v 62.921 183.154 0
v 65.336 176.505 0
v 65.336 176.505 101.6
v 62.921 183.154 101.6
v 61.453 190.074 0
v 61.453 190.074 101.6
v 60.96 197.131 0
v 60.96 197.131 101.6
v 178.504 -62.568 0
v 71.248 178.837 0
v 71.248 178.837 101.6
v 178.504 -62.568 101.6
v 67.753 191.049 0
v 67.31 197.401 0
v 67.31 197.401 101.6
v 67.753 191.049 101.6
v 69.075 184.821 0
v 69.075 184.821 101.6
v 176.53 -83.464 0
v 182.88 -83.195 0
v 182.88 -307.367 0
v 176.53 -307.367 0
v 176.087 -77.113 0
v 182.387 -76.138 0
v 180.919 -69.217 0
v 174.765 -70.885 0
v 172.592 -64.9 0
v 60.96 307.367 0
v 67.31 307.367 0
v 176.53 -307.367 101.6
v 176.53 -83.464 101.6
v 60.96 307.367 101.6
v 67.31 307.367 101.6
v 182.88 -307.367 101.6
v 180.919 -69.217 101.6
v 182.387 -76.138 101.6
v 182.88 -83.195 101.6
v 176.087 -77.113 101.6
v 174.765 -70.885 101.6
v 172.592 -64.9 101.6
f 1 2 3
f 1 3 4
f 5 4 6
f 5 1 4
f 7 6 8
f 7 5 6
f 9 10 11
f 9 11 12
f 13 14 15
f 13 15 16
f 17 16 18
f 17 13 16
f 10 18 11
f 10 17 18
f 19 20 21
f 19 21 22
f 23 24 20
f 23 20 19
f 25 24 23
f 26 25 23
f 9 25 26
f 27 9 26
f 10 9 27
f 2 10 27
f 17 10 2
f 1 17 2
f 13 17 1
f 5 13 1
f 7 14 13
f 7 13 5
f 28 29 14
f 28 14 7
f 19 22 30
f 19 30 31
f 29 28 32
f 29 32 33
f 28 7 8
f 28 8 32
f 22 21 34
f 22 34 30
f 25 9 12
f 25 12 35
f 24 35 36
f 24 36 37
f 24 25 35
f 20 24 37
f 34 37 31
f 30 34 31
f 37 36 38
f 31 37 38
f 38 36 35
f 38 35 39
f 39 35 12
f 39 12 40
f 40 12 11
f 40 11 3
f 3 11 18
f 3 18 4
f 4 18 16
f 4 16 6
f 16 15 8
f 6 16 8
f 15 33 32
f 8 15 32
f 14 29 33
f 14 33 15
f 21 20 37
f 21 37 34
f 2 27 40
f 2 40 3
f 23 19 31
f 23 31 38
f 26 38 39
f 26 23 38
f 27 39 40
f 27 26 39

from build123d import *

# Parameters (mm, degrees)
BOSS_EXTRUDE1_DEPTH = 101.6


with BuildPart() as part:
    # Sketch1 → Boss-Extrude1 (new body)
    with BuildSketch(Plane.XY):
        with BuildLine():
            Line((60.96, 197.131308881), (60.96, 307.367308881))
            Line((60.96, 307.367308881), (67.31, 307.367308881))
            Line((67.31, 307.367308881), (67.31, 197.400739769))
            ThreePointArc((67.31, 197.400739769), (68.305399944, 187.9124022), (71.248256772, 178.837218205))
            Line((71.248256772, 178.837218205), (178.504159142, -62.568409333))
            ThreePointArc((178.504159142, -62.568409333), (181.774000062, -72.651947106), (182.88, -83.194544404))
            Line((182.88, -83.194544404), (182.88, -307.367308881))
            Line((182.88, -307.367308881), (176.53, -307.367308881))
            Line((176.53, -307.367308881), (176.53, -83.463975292))
            ThreePointArc((176.53, -83.463975292), (175.534600056, -73.975637723), (172.591743228, -64.900453728))
            Line((172.591743228, -64.900453728), (65.335840858, 176.50517381))
            ThreePointArc((65.335840858, 176.50517381), (62.065999938, 186.588711582), (60.96, 197.131308881))
        make_face()
    extrude(amount=BOSS_EXTRUDE1_DEPTH)


solid = part.part
